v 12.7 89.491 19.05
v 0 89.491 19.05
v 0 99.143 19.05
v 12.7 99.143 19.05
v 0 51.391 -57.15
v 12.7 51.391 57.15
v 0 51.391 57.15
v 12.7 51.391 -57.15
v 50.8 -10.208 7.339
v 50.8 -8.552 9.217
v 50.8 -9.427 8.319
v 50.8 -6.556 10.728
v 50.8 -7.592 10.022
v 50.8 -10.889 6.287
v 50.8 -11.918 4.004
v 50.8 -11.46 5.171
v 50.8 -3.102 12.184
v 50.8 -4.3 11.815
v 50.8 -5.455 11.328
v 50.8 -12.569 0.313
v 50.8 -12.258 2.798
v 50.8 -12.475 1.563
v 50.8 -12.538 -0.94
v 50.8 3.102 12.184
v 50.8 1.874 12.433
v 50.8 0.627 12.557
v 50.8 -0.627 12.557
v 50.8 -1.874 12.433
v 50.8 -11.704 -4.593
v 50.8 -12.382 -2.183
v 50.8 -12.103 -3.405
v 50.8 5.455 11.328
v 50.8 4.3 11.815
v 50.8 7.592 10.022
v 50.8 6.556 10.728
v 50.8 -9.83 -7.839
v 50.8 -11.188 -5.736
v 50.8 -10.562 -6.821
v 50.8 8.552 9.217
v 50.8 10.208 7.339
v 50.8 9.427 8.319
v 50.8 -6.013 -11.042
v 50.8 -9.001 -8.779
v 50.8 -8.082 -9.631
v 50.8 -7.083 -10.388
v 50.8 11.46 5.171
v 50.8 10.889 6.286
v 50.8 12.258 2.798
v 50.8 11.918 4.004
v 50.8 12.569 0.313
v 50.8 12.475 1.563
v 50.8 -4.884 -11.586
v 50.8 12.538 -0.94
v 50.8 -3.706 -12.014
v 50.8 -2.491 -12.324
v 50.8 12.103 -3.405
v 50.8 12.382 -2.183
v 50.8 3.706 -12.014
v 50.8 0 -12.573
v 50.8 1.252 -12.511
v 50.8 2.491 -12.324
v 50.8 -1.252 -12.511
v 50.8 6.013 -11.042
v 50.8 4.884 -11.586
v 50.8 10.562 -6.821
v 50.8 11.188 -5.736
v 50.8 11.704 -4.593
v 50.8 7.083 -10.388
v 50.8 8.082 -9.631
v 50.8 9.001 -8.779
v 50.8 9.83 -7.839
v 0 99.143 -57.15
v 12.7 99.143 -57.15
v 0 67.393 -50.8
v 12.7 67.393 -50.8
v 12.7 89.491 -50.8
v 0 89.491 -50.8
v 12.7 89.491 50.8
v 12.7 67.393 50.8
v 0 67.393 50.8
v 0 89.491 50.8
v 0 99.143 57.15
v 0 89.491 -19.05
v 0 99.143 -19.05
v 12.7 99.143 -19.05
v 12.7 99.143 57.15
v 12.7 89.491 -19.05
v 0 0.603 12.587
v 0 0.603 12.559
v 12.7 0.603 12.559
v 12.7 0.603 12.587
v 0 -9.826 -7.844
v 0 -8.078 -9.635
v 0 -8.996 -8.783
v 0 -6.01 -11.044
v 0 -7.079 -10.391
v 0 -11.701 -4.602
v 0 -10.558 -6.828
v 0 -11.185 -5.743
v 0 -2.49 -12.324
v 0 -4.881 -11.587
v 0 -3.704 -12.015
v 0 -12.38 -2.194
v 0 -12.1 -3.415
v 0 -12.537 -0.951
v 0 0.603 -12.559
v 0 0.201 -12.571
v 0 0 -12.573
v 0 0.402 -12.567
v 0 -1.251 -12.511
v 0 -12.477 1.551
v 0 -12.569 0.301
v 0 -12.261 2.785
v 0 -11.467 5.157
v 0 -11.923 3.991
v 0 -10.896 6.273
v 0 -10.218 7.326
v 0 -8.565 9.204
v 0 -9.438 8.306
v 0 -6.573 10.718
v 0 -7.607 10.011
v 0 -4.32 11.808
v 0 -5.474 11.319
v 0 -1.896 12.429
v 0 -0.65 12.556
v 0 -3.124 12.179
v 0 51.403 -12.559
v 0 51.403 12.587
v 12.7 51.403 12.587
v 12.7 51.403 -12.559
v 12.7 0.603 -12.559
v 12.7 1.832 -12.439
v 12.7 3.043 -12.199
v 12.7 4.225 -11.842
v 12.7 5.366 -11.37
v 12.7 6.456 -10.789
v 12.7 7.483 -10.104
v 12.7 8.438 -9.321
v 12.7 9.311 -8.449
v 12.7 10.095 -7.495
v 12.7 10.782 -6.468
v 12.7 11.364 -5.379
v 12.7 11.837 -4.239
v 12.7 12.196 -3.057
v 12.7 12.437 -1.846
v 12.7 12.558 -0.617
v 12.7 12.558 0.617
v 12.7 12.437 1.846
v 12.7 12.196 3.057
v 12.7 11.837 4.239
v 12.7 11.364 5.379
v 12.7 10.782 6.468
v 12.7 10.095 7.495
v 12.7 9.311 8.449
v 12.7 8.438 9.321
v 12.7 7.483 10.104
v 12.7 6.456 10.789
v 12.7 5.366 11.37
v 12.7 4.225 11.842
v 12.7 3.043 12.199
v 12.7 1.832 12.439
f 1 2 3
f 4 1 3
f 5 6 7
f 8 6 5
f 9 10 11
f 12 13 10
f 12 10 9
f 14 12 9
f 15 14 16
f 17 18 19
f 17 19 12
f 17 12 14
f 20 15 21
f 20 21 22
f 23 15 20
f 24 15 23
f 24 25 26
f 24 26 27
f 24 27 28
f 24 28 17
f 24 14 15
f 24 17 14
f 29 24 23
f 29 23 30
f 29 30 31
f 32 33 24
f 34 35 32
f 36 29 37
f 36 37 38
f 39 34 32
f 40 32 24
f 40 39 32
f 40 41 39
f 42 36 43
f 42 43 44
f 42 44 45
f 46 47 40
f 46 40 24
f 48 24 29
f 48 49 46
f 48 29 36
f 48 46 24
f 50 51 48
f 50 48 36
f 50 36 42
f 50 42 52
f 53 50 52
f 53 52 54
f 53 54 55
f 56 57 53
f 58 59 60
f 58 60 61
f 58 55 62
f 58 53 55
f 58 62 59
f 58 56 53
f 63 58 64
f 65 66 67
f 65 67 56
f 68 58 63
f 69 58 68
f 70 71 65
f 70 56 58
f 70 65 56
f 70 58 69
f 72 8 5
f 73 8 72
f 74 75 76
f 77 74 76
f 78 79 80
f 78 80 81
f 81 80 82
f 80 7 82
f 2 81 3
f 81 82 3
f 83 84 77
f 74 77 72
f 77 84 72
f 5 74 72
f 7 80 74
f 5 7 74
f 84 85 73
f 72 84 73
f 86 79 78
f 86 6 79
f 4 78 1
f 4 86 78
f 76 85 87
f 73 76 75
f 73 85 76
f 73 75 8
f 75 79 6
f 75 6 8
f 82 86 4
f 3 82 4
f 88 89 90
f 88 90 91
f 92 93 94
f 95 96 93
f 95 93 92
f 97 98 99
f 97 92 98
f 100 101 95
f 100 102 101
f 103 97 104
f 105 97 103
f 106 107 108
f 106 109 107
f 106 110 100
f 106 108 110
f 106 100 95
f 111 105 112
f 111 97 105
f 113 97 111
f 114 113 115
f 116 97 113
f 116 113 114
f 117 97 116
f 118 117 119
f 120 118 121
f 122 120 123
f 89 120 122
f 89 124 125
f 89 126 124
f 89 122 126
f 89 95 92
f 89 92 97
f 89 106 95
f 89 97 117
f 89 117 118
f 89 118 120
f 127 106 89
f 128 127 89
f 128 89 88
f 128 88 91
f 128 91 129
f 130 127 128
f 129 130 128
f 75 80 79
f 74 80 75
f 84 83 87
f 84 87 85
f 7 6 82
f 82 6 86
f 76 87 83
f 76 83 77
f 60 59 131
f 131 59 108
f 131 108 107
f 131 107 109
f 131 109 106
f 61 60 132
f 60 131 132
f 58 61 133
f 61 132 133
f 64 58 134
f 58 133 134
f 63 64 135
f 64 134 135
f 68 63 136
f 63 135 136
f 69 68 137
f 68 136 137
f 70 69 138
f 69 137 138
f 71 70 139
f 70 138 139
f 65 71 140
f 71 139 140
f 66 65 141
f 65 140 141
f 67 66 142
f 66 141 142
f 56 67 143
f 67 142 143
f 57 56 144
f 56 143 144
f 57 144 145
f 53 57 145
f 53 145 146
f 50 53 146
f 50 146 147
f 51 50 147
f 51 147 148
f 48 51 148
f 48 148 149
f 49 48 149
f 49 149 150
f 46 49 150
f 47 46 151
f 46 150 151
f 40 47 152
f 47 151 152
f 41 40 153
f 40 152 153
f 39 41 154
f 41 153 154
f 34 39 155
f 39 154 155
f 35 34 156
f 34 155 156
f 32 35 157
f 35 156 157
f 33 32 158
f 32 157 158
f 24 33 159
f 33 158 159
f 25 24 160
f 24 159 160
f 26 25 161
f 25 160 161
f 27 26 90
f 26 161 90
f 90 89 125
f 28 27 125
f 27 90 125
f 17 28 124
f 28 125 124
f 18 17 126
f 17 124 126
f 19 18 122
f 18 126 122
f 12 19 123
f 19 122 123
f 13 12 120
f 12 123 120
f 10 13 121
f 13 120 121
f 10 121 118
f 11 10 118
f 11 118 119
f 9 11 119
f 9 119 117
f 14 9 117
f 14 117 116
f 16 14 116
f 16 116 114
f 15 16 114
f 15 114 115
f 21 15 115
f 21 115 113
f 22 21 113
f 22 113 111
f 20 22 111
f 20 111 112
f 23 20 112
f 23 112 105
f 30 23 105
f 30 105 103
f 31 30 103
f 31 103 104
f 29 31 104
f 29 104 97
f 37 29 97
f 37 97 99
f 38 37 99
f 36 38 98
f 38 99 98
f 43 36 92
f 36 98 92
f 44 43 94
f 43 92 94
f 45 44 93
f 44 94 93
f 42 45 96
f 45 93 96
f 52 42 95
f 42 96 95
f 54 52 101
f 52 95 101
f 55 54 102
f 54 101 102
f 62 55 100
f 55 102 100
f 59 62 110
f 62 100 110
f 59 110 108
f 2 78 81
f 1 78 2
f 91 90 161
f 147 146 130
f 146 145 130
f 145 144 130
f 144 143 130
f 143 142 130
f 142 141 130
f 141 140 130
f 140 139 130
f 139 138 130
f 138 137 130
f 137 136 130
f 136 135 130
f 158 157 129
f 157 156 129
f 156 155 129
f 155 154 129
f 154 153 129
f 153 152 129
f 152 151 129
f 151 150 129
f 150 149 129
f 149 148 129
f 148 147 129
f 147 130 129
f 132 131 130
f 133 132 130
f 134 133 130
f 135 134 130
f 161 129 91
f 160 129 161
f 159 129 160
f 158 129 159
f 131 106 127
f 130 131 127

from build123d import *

# Parameters (mm, degrees)
SKETCH2_R       = 12.573
FEATURE_A_DEPTH = 50.8
SKETCH3_W       = 25.146
SKETCH3_H       = 50.8
FEATURE_B_DEPTH = 12.7
SKETCH5_W       = 101.6
SKETCH5_H       = 16.002
FEATURE_C_DEPTH = 12.7
SKETCH10_W      = 6.35
SKETCH10_H      = 38.1
FEATURE_D_DEPTH = 12.7
SKETCH11_W      = 38.1
SKETCH11_H      = 9.652
FEATURE_E_DEPTH = 12.7


with BuildPart() as part:
    # Sketch2 → Feature A (new body)
    with BuildSketch(Plane(origin=(0, 0, 0), x_dir=(0, 0, -1), z_dir=(1, 0, 0))):
        Circle(SKETCH2_R)
    extrude(amount=FEATURE_A_DEPTH)

    # Sketch3 → Feature B (add)
    with BuildSketch(Plane.ZY):
        with Locations((0.014451225, 26.002645546)):
            Rectangle(SKETCH3_W, SKETCH3_H)
    extrude(amount=-FEATURE_B_DEPTH)


with BuildPart() as body_2:
    # Sketch5 → Feature C (new body)
    with BuildSketch(Plane(origin=(0, 0, 0), x_dir=(0, 0, -1), z_dir=(1, 0, 0))):
        with Locations((0, 59.392294155)):
            Rectangle(SKETCH5_W, SKETCH5_H)
    extrude(amount=FEATURE_C_DEPTH)

    # Sketch10 → Feature D (add, through all)
    with BuildSketch(Plane(origin=(12.7, 0, 0), x_dir=(0, 0, -1), z_dir=(1, 0, 0))):
        with Locations((-53.975, 70.441294155)):
            Rectangle(SKETCH10_W, SKETCH10_H)
        with Locations((53.975, 70.441294155)):
            Rectangle(SKETCH10_W, SKETCH10_H)
    extrude(amount=-FEATURE_D_DEPTH)

    # Sketch11 → Feature E (add, through all)
    with BuildSketch(Plane(origin=(12.7, 0, 0), x_dir=(0, 0, -1), z_dir=(1, 0, 0))):
        with Locations((-38.1, 94.317294155)):
            Rectangle(SKETCH11_W, SKETCH11_H)
        with Locations((38.1, 94.317294155)):
            Rectangle(SKETCH11_W, SKETCH11_H)
    extrude(amount=-FEATURE_E_DEPTH)


solid = Compound([part.part, body_2.part])
